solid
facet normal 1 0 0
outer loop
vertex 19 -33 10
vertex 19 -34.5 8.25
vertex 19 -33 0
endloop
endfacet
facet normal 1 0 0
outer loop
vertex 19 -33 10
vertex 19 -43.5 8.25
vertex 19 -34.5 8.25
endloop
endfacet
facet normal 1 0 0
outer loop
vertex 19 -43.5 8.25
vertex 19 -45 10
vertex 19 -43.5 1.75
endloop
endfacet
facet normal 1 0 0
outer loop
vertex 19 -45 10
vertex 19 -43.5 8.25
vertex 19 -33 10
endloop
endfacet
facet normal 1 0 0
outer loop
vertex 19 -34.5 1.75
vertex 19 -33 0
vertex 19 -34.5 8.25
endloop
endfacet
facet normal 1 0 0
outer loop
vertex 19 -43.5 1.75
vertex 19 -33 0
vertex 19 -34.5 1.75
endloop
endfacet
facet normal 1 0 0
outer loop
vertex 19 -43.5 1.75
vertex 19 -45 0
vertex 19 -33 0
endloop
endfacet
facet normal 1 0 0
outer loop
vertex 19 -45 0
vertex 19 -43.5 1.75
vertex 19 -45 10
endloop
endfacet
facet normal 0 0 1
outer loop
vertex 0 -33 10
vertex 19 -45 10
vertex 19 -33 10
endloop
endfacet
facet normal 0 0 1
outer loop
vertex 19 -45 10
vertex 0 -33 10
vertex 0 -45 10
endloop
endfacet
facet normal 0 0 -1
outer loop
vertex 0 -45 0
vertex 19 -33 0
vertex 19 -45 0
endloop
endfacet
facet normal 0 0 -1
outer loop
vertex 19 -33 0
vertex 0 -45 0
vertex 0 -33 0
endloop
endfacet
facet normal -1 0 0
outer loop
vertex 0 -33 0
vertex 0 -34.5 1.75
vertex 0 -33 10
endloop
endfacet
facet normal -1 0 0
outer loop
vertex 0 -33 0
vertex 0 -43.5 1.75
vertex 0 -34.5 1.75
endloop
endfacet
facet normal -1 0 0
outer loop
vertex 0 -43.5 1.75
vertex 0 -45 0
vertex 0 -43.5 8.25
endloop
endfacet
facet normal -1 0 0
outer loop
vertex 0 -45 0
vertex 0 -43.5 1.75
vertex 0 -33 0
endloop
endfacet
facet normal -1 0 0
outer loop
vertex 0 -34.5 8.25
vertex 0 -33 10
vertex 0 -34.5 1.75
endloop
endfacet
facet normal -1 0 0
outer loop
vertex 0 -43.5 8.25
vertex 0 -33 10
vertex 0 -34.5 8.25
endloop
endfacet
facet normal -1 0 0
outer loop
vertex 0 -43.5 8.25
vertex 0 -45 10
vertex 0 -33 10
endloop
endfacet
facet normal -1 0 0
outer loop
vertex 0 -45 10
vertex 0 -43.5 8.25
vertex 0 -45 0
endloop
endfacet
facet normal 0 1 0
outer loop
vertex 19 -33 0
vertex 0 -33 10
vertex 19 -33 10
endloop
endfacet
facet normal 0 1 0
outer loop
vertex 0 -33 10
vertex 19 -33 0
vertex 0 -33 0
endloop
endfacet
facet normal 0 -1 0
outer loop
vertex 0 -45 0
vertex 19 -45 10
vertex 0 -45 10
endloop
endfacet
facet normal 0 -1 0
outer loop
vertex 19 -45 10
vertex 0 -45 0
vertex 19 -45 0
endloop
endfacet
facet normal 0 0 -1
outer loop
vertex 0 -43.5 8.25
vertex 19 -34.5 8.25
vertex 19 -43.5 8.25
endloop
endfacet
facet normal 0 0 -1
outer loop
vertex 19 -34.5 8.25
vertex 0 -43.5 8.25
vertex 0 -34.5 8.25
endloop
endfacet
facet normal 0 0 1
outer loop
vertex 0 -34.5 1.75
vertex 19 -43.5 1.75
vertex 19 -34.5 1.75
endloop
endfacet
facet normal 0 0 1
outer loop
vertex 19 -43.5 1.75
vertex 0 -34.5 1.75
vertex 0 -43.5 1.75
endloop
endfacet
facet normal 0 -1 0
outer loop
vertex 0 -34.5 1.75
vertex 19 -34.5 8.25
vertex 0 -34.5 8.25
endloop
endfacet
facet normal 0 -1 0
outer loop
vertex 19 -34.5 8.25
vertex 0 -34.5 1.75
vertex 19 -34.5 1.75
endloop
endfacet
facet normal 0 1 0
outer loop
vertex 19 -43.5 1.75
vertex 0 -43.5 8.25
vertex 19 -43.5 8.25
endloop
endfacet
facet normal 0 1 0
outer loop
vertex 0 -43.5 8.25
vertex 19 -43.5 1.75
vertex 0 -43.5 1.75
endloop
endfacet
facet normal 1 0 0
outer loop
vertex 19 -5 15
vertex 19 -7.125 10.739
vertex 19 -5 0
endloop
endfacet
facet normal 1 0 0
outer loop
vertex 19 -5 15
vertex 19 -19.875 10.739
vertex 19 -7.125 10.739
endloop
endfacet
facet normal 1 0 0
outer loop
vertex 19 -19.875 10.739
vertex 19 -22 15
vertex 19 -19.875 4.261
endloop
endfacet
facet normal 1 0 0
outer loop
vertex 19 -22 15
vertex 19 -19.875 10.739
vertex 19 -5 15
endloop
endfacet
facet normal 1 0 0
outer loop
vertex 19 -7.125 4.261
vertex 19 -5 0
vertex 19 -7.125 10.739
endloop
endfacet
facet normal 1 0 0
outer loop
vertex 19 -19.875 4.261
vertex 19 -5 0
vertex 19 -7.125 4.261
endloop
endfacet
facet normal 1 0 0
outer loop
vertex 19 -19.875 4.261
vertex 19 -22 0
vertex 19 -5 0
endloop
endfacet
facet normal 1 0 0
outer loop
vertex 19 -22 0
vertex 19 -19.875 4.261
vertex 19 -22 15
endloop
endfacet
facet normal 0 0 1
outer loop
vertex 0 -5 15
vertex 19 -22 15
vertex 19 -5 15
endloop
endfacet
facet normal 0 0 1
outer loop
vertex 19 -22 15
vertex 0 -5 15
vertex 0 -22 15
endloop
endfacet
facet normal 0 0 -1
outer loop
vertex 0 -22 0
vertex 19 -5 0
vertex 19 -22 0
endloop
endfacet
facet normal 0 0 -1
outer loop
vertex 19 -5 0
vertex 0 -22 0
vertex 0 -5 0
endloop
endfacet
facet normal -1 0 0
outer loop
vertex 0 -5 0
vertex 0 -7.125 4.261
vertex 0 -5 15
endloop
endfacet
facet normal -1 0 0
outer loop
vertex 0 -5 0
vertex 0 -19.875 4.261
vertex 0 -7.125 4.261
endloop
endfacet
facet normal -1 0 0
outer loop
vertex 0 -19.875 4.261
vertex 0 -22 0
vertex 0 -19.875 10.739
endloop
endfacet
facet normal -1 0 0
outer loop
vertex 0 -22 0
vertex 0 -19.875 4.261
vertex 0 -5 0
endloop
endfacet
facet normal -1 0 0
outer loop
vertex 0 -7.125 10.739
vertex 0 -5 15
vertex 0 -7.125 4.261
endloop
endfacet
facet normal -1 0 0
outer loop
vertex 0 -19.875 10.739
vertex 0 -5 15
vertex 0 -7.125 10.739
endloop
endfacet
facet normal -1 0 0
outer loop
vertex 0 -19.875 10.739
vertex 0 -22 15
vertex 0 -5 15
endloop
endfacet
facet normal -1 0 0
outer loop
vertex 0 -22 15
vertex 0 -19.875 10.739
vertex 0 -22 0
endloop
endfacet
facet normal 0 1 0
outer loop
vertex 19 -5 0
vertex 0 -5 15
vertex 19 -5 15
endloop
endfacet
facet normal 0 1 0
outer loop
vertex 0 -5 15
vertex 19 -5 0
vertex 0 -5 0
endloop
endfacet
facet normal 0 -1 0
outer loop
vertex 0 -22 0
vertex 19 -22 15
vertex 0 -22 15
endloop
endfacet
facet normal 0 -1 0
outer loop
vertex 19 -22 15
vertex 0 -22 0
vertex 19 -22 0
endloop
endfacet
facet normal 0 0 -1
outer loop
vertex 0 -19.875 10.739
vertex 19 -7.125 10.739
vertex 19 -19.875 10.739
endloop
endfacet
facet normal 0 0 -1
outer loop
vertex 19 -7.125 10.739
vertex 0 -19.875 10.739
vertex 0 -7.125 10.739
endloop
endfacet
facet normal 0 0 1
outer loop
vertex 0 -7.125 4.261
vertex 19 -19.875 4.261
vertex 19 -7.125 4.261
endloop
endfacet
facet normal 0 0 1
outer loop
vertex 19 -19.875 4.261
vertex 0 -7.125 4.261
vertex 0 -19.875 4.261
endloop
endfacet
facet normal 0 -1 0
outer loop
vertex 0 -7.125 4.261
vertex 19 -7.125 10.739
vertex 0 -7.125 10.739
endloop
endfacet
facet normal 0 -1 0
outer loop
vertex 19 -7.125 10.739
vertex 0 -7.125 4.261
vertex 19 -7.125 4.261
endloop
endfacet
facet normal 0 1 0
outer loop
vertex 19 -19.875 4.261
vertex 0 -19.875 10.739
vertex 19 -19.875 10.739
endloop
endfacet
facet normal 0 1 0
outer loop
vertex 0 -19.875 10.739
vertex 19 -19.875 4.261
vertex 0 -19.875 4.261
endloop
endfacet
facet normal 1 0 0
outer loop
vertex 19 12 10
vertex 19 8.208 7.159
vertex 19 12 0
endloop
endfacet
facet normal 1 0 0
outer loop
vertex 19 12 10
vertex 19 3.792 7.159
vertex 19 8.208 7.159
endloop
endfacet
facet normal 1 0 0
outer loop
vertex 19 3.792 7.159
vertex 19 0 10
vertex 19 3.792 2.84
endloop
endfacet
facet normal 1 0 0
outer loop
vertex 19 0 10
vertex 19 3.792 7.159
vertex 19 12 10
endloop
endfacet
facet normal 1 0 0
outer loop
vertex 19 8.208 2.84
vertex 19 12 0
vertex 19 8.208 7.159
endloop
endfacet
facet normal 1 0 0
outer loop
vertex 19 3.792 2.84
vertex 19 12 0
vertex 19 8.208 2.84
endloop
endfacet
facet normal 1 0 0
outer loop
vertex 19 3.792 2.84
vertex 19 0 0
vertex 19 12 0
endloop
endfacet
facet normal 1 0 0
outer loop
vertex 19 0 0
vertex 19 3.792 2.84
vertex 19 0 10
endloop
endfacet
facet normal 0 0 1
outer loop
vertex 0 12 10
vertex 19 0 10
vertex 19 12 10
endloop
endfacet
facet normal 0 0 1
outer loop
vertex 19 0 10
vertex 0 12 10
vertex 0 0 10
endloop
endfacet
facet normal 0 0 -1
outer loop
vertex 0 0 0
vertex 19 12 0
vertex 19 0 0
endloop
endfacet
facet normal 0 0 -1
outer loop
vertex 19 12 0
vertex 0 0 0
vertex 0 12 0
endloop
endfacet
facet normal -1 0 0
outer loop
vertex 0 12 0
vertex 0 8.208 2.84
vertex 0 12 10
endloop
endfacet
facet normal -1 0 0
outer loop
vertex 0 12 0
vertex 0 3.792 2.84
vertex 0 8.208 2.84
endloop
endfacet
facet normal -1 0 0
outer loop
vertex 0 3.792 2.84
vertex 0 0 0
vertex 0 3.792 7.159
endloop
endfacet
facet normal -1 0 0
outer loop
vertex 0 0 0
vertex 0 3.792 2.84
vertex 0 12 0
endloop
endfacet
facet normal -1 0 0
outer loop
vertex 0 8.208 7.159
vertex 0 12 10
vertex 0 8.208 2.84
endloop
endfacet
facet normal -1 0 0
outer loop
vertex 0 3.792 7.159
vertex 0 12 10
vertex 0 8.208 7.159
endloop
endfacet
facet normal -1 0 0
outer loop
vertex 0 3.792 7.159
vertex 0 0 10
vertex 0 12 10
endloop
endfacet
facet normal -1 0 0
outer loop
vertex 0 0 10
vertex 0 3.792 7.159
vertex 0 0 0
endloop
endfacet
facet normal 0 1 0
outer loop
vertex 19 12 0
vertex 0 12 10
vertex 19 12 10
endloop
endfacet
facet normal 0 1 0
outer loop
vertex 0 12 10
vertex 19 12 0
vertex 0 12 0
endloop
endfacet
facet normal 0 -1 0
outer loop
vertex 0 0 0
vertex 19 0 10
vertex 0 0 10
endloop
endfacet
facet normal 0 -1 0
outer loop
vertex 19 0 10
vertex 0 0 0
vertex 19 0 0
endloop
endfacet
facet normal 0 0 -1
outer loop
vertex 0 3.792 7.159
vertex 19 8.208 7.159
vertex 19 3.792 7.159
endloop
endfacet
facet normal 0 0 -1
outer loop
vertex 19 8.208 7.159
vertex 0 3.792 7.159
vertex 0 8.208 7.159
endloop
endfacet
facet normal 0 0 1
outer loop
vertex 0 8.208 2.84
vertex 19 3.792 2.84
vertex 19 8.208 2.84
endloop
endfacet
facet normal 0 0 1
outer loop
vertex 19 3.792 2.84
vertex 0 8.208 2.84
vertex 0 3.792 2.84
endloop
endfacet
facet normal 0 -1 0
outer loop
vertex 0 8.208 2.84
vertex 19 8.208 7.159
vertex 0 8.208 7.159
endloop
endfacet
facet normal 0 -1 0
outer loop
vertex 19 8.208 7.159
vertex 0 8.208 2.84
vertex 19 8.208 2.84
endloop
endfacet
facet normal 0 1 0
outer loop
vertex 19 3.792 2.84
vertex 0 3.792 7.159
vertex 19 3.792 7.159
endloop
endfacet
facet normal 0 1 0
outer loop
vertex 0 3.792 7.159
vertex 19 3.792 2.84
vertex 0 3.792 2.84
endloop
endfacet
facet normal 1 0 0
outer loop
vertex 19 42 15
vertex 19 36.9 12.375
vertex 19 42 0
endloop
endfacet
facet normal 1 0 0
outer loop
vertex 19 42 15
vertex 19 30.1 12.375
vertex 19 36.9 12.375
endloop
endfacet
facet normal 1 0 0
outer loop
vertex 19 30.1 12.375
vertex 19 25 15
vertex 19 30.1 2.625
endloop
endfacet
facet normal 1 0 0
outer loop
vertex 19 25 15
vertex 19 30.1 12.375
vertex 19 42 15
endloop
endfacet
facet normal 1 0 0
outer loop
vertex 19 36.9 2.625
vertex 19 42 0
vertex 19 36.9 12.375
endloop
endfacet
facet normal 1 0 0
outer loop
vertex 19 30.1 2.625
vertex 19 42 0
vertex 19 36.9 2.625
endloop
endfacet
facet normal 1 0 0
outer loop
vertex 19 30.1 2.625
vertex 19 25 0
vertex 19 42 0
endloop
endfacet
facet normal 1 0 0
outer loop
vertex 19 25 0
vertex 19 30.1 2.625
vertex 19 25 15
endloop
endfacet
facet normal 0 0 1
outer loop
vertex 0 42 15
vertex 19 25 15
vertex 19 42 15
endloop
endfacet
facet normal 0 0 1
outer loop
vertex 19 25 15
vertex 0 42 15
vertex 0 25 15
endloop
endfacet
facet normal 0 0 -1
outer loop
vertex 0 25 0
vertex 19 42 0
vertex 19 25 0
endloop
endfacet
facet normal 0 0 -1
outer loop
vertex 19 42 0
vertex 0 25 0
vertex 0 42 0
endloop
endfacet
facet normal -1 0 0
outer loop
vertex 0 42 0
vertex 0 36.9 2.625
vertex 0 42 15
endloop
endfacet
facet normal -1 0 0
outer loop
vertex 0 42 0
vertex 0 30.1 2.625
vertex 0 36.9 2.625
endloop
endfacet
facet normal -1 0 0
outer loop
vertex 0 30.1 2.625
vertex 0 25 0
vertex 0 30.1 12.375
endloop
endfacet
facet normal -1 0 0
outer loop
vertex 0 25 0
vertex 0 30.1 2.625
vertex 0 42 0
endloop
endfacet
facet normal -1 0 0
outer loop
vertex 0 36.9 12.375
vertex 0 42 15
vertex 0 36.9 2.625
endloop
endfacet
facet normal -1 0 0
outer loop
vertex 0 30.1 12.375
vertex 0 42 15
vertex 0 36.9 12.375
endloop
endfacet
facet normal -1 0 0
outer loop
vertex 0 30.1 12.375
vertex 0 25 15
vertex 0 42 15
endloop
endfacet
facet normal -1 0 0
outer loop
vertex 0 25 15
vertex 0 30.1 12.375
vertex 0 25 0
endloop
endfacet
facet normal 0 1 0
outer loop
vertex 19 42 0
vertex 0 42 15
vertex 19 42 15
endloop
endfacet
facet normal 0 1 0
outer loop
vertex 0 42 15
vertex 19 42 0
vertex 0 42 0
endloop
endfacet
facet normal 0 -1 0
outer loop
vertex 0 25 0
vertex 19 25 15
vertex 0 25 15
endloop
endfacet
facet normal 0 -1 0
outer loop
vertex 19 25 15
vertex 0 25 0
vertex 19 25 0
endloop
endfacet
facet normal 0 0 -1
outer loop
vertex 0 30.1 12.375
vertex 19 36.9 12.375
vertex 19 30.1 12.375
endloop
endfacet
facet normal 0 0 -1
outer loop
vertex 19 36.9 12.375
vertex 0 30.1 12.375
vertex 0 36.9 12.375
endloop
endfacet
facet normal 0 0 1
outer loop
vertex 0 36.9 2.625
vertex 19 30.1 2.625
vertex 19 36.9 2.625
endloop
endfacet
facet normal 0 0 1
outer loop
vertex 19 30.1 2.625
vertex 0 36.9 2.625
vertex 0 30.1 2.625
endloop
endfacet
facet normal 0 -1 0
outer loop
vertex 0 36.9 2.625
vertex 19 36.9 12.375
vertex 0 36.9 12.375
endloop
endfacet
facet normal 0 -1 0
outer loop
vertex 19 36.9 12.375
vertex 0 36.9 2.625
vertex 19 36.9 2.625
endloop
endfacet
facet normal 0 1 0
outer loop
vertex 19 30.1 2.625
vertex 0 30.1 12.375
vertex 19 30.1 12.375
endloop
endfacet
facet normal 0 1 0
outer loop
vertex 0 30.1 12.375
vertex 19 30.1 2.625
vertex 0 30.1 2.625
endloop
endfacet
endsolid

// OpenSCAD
// file: ../../chain-loop.scad
module chainLoop(cutoutAxis = "x",
				 xLength = 19,
				 xPercentage = 1.0,
                 yLength = 12,
                 yPercentage = 0.75,
                 zLength = 10,
                 zPercentage = 0.65)
{
    difference()
    {
        color("green")
        cube([xLength, yLength, zLength]);
        cutout(cutoutAxis,
				xLength,
				xPercentage,
				yLength,
				yPercentage,
				zLength,
				zPercentage);
    }
}

/**
 * This module takes the cubic lengths of the chain loop and calculates the
 * dimensions of the cot out protion based on the percentages given.
 *
 * The percentages are expected to be of type float with 1 being 100%.
 */
module cutout(cutoutAxis = "x",
			  xLength,
			  xPercentage = 1.0,
              yLength,
              yPercentage,
              zLength,
              zPercentage
        )
{


	if(cutoutAxis == "x")
	{
		zCutoutLength = zLength * zPercentage;
	    zTranslate = (zLength/2.0) - (zCutoutLength / 2.0);

	    yCutoutLength = yLength * yPercentage;

	    yTranslate = (yLength / 2.0) - (yCutoutLength / 2.0);

	    translate([-1, yTranslate, zTranslate])
	    cube([xLength+3, yCutoutLength, zCutoutLength]);
	}
	else if(cutoutAxis == "z")
	{
		zCutoutLength = zLength * zPercentage;
	    zTranslate = (zLength/2.0) - (zCutoutLength / 2.0);

	    yCutoutLength = yLength * yPercentage;

	    yTranslate = (yLength / 2.0) - (yCutoutLength / 2.0);


		xCoutoutLength = zLength * xPercentage;
		xTranslate = 01;
//		yTranslate = 2;

		translate([xTranslate, yTranslate, -1])
	    cube([xCoutoutLength, yCutoutLength, zLength+3]);
	}
}
// main file
use <../../chain-loop.scad>

color("blue")
translate([0, -45, 0])
chainLoop();

translate([0, -22, 0])
chainLoop(yLength = 17,
          zLength = 15,
          zPercentage=0.4319);

color("orange")
translate([0, 0, 0])
chainLoop(yPercentage = 0.368,
          zPercentage=0.4319);

color("pink")
translate([0, 25, 0])
chainLoop(xLength = 19,
          yLength = 17,
          yPercentage = 0.4,
          zLength = 15);
    
